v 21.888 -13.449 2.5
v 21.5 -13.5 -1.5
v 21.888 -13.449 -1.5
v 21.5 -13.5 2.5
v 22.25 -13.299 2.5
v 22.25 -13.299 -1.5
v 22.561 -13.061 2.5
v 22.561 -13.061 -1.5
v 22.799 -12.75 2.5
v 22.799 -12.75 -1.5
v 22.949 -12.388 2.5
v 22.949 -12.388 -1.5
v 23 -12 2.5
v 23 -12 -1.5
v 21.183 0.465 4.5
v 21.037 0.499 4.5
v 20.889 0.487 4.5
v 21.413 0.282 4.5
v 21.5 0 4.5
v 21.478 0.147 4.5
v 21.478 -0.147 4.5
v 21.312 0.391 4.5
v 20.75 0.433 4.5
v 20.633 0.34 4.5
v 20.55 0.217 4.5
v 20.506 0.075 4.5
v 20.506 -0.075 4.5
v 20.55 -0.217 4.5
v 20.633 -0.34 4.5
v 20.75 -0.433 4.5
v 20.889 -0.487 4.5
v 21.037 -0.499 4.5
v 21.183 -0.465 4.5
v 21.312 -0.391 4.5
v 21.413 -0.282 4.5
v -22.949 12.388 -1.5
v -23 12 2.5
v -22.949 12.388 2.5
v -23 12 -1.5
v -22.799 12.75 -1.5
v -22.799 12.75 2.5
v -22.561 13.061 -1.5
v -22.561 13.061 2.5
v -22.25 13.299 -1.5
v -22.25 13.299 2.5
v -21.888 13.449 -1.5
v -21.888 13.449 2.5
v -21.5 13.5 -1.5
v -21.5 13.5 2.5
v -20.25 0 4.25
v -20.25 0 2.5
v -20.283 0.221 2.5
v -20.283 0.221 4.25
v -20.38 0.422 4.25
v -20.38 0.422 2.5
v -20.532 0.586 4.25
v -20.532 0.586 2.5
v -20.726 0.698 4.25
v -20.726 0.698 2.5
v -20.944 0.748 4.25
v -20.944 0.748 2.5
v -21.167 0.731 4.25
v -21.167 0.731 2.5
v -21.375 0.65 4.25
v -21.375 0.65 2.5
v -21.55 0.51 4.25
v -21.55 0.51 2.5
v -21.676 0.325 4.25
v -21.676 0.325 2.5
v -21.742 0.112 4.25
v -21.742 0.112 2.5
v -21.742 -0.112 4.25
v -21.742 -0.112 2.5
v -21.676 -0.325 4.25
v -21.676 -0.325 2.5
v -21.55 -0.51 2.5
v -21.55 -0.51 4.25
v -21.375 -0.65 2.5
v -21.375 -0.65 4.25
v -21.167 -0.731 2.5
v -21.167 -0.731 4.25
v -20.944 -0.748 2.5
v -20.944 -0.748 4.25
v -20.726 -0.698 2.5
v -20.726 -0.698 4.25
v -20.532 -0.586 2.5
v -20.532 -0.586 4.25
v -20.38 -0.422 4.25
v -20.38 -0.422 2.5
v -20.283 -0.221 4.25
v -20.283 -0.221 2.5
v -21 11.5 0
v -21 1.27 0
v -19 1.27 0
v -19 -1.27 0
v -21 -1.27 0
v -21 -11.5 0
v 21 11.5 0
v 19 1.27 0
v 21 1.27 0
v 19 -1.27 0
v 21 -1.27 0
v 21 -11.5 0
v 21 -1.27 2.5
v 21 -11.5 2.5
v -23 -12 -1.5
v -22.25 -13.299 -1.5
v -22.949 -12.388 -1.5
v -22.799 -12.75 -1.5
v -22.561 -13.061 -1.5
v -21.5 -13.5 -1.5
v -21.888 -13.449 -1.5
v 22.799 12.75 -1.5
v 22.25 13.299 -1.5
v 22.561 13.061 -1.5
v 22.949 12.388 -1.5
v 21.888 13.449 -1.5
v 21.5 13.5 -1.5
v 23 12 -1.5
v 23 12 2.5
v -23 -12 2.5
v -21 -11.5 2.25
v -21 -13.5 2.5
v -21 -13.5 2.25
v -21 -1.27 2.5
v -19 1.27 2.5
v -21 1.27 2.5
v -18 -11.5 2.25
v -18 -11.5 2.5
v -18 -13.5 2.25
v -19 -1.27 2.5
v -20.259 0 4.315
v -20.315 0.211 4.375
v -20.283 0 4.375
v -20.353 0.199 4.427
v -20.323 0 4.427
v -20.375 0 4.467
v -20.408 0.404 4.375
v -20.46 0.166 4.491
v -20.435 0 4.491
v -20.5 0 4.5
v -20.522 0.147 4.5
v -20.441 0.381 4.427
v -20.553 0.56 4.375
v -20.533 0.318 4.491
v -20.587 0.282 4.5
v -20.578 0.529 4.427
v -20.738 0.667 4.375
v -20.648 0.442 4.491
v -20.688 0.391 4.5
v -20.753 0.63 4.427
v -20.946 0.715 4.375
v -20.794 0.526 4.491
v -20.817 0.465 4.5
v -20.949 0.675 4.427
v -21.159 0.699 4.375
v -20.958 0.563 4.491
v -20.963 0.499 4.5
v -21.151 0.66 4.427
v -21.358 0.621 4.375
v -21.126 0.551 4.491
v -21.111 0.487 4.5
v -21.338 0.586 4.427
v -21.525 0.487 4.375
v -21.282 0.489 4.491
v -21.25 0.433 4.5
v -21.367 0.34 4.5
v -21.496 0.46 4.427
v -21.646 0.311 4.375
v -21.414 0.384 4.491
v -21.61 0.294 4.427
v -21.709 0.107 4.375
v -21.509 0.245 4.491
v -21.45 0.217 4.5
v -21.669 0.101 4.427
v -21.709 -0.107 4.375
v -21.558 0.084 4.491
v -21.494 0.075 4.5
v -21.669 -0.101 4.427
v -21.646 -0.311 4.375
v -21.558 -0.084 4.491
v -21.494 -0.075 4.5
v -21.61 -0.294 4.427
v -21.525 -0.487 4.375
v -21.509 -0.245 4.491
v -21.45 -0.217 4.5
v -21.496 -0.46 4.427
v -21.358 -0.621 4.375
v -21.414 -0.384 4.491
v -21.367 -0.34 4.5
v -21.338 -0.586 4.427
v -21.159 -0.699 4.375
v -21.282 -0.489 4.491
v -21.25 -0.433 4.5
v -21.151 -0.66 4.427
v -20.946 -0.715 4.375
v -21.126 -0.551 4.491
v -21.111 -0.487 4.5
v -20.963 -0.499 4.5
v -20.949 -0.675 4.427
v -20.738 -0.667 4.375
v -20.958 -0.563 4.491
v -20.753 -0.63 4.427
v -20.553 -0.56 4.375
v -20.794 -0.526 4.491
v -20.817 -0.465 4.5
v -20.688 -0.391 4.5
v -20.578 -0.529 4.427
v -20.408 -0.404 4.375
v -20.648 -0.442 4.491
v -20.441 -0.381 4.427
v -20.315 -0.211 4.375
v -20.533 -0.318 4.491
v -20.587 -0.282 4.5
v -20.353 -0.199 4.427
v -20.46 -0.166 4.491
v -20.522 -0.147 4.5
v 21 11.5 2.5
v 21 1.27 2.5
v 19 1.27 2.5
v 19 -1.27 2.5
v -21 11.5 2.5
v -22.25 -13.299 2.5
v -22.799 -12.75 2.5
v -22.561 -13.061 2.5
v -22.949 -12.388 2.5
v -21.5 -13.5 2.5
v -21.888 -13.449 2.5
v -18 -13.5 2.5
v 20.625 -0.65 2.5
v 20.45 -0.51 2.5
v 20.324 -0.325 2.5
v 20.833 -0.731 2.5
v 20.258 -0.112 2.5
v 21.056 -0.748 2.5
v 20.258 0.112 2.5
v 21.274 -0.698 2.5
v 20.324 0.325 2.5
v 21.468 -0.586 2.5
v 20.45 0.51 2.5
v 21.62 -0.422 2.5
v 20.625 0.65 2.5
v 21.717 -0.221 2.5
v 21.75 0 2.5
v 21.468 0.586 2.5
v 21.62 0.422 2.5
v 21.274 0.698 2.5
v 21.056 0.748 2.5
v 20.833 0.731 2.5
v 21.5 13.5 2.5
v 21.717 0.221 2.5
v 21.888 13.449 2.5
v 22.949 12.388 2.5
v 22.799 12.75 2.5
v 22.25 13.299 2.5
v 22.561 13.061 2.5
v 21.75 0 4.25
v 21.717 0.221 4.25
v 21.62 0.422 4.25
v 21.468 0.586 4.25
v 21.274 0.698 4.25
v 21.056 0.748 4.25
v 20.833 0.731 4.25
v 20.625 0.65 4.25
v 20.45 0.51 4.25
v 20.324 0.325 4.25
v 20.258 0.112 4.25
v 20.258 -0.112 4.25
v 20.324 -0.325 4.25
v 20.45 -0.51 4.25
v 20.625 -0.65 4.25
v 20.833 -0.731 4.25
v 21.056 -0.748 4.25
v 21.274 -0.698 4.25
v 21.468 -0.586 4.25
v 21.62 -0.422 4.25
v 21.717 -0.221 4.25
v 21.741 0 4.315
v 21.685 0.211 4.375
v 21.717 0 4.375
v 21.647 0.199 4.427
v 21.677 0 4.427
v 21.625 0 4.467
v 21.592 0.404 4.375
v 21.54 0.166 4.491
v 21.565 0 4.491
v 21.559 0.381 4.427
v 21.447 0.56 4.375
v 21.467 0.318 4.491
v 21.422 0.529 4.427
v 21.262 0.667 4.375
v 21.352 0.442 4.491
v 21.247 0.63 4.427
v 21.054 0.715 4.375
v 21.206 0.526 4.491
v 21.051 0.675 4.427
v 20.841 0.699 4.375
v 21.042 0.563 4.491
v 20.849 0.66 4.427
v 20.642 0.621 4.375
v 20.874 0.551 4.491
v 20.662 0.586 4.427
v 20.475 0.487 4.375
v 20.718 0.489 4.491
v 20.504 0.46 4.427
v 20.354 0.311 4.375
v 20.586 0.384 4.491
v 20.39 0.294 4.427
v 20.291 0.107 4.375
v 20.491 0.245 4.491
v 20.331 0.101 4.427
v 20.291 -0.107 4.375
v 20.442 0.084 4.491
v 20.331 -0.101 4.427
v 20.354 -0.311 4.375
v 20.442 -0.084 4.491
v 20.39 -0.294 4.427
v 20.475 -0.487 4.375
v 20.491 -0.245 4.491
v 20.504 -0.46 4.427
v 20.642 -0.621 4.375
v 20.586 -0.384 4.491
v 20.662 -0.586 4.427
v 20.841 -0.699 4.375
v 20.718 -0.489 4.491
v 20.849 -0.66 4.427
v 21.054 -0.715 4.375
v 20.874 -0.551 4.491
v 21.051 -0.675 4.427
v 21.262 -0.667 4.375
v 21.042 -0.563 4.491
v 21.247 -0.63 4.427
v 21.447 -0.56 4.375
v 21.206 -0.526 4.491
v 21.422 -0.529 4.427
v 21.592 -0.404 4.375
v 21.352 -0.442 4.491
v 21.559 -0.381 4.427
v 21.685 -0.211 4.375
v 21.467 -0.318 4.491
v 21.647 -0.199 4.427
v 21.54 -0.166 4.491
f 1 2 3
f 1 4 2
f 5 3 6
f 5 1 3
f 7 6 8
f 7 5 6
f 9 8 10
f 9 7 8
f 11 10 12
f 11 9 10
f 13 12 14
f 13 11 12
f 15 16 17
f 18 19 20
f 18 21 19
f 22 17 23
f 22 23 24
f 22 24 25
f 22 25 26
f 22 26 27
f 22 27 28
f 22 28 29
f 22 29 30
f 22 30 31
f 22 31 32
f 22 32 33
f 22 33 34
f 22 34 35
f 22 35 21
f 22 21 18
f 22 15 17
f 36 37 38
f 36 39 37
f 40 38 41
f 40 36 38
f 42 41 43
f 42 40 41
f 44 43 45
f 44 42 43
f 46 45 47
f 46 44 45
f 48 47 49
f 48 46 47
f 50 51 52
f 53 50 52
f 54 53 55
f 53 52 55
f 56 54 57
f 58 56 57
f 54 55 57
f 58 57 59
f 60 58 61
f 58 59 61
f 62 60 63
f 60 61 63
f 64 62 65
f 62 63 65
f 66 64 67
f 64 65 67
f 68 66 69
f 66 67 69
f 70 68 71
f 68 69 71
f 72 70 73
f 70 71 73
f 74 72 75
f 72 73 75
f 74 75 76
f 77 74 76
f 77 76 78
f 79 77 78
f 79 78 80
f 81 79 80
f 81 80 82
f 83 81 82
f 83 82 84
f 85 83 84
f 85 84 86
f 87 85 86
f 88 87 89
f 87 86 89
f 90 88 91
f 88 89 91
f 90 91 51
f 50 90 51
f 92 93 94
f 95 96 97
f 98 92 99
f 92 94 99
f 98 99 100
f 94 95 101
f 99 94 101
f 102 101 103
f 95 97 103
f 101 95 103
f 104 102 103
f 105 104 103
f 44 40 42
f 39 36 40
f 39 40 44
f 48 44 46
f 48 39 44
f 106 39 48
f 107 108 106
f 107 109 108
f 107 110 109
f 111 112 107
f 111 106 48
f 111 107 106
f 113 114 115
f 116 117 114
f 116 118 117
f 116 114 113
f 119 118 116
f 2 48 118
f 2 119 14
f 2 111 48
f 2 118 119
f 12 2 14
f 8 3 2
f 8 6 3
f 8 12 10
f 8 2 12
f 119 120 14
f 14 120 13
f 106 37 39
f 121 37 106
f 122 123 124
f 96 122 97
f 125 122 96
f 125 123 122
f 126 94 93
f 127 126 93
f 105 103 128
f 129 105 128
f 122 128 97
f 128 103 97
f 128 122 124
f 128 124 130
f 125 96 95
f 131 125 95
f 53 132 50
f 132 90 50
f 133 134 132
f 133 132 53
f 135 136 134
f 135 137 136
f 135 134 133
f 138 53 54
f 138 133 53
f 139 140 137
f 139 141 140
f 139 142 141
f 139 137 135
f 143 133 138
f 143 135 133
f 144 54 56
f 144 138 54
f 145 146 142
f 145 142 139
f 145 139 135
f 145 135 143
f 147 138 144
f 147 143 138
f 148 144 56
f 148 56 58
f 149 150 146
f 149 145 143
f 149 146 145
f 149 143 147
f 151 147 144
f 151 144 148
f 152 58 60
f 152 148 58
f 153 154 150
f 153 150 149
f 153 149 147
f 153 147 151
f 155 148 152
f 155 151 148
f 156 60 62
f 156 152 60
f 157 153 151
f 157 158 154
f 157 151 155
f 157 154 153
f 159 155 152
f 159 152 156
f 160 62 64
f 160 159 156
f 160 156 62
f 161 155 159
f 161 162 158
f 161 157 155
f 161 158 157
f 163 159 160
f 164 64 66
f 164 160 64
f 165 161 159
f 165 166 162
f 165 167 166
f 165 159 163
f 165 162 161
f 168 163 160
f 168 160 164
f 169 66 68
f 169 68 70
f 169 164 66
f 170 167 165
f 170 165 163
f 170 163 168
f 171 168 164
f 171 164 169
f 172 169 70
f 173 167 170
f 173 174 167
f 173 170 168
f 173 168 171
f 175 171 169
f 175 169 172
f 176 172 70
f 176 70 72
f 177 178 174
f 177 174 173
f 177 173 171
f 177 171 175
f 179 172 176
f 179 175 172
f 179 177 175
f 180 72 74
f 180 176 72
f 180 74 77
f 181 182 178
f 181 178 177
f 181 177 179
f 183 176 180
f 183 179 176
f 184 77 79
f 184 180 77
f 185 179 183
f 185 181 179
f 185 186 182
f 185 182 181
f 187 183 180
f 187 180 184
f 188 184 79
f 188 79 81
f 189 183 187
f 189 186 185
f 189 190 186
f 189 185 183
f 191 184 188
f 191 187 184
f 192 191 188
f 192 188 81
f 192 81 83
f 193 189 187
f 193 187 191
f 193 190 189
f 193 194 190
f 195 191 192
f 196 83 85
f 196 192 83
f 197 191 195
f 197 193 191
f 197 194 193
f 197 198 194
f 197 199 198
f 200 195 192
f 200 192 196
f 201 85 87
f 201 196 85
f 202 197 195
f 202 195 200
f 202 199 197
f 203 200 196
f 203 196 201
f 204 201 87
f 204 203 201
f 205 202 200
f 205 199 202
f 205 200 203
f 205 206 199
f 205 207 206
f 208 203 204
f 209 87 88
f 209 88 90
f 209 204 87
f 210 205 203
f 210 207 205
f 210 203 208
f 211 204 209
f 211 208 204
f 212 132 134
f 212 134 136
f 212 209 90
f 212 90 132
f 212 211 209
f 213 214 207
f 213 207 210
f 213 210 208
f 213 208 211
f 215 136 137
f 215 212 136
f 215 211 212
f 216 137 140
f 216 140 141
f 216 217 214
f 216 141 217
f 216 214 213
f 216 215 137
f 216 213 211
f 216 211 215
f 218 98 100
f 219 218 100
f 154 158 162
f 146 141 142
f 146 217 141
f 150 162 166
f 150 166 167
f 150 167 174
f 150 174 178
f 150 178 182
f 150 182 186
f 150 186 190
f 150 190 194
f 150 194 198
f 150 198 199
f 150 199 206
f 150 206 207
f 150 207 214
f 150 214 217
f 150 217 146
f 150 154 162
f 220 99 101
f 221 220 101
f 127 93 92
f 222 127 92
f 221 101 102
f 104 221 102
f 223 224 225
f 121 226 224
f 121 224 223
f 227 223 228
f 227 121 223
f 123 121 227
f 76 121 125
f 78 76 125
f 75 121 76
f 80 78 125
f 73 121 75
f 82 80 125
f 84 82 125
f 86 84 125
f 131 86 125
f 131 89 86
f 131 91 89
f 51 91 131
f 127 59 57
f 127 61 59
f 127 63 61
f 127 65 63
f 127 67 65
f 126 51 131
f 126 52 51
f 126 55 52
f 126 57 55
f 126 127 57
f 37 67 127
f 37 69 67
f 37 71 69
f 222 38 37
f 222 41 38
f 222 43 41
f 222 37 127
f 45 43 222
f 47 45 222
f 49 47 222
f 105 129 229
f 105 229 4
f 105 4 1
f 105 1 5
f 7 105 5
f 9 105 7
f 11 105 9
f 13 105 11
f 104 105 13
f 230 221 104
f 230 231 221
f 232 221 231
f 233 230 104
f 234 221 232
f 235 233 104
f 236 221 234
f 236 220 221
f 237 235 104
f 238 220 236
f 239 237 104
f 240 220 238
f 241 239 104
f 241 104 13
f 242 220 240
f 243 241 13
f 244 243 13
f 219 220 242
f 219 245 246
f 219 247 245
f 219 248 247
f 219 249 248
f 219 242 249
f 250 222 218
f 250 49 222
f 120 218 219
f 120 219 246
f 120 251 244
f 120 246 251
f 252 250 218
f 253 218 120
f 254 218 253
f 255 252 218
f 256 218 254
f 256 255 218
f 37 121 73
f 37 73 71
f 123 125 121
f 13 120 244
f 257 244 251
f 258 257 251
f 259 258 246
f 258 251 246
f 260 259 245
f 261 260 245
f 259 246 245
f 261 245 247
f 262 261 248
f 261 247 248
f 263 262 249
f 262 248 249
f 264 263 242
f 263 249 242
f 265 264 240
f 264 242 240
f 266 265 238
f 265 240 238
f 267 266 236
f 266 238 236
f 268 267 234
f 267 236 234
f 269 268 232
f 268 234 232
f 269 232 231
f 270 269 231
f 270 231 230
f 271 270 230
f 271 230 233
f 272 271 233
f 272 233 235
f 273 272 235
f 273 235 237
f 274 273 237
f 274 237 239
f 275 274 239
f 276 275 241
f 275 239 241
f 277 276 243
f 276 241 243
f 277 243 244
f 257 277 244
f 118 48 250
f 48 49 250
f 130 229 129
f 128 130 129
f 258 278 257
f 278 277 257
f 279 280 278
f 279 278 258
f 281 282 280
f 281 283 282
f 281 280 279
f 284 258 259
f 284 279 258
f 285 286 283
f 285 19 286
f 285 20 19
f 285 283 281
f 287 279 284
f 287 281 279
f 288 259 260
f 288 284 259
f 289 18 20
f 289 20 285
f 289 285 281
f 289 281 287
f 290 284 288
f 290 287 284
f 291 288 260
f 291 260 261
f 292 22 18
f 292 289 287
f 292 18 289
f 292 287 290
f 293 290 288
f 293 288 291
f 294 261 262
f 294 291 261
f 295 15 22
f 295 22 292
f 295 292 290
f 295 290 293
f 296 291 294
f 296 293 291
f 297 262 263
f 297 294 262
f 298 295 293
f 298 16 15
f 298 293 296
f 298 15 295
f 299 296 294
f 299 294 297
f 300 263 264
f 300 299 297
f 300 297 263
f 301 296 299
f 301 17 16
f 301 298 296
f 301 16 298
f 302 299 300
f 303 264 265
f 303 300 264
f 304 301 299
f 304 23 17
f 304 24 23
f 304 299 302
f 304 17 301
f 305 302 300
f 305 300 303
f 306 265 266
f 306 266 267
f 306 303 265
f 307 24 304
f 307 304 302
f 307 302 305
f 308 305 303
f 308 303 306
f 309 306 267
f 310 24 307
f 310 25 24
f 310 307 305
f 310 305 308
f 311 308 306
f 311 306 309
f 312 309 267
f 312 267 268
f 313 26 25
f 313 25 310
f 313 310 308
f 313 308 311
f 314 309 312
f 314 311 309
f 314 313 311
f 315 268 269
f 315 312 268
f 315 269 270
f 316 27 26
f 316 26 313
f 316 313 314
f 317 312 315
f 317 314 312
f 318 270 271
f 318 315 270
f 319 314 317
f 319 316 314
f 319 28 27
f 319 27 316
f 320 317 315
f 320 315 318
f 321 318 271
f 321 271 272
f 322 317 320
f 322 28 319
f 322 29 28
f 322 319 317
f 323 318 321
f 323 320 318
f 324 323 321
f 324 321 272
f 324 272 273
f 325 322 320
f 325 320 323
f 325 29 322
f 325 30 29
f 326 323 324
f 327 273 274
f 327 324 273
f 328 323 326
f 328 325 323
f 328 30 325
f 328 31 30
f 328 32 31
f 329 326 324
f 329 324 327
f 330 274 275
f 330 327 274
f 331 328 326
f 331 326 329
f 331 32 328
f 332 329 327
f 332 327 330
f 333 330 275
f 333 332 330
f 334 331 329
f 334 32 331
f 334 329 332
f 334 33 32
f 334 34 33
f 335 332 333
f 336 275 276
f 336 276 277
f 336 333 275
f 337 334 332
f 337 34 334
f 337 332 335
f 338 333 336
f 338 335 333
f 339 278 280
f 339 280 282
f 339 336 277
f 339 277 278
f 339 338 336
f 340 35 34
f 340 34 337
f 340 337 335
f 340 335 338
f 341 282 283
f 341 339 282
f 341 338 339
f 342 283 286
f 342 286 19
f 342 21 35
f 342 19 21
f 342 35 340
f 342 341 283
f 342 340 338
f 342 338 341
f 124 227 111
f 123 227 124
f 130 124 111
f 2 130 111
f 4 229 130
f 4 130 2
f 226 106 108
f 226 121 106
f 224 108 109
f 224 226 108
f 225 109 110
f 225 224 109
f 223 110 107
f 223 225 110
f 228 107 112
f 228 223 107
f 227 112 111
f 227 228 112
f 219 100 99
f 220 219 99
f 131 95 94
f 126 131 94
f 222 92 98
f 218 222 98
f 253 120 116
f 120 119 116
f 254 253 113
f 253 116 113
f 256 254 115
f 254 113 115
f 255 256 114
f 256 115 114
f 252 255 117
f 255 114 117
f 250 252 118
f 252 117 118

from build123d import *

# Parameters (mm, degrees)
SKETCH_W     = 46
SKETCH_H     = 27
PAD_DEPTH    = 2.5
SKETCH001_W  = 46
SKETCH001_H  = 27
PAD001_DEPTH = 1.5
SKETCH002_R  = 0.75
PAD002_DEPTH = 2
SKETCH003_W  = 3
SKETCH003_H  = 2
POCKET_DEPTH = 0.25
FILLET_R     = 0.25
FILLET001_R  = 1.5


with BuildPart() as part:
    # Sketch → Pad (new body)
    with BuildSketch(Plane.XY):
        Rectangle(SKETCH_W, SKETCH_H)
        Polygon((-21, 11.5), (21, 11.5), (21, 1.27), (19, 1.27), (19, -1.27), (21, -1.27), (21, -11.5), (-21, -11.5), (-21, -1.27), (-19, -1.27), (-19, 1.27), (-21, 1.27), align=None, mode=Mode.SUBTRACT)
    extrude(amount=PAD_DEPTH)

    # Sketch001 (on Face17 of Pad) → Pad001 (join)
    with BuildSketch(Plane(origin=(0, 0, 0), x_dir=(1, 0, 0), z_dir=(0, 0, -1))):
        Rectangle(SKETCH001_W, SKETCH001_H)
    extrude(amount=PAD001_DEPTH)

    # Sketch002 (on Face5 of Pad001) → Pad002 (join)
    with BuildSketch(Plane.XY.offset(2.5)):
        with Locations((-21, 0)):
            Circle(SKETCH002_R)
        with Locations((21, 0)):
            Circle(SKETCH002_R)
    extrude(amount=PAD002_DEPTH)

    # Sketch003 → Pocket (cut)
    with BuildSketch(Plane.XY.offset(2.5)):
        with Locations((-19.5, -12.5)):
            Rectangle(SKETCH003_W, SKETCH003_H)
    extrude(amount=-POCKET_DEPTH, mode=Mode.SUBTRACT)

    # Fillet
    fillet_edges = [part.edges().sort_by_distance(p)[0] for p in [
        (20.25, 0, 4.5),
        (-21.75, 0, 4.5),
    ]]
    fillet(fillet_edges, radius=FILLET_R)

    # Fillet001
    fillet001_edges = [part.edges().sort_by_distance(p)[0] for p in [
        (-23, -13.5, 1.25),
        (23, -13.5, 1.25),
        (-23, 13.5, 1.25),
        (23, 13.5, 1.25),
    ]]
    fillet(fillet001_edges, radius=FILLET001_R)


solid = part.part
